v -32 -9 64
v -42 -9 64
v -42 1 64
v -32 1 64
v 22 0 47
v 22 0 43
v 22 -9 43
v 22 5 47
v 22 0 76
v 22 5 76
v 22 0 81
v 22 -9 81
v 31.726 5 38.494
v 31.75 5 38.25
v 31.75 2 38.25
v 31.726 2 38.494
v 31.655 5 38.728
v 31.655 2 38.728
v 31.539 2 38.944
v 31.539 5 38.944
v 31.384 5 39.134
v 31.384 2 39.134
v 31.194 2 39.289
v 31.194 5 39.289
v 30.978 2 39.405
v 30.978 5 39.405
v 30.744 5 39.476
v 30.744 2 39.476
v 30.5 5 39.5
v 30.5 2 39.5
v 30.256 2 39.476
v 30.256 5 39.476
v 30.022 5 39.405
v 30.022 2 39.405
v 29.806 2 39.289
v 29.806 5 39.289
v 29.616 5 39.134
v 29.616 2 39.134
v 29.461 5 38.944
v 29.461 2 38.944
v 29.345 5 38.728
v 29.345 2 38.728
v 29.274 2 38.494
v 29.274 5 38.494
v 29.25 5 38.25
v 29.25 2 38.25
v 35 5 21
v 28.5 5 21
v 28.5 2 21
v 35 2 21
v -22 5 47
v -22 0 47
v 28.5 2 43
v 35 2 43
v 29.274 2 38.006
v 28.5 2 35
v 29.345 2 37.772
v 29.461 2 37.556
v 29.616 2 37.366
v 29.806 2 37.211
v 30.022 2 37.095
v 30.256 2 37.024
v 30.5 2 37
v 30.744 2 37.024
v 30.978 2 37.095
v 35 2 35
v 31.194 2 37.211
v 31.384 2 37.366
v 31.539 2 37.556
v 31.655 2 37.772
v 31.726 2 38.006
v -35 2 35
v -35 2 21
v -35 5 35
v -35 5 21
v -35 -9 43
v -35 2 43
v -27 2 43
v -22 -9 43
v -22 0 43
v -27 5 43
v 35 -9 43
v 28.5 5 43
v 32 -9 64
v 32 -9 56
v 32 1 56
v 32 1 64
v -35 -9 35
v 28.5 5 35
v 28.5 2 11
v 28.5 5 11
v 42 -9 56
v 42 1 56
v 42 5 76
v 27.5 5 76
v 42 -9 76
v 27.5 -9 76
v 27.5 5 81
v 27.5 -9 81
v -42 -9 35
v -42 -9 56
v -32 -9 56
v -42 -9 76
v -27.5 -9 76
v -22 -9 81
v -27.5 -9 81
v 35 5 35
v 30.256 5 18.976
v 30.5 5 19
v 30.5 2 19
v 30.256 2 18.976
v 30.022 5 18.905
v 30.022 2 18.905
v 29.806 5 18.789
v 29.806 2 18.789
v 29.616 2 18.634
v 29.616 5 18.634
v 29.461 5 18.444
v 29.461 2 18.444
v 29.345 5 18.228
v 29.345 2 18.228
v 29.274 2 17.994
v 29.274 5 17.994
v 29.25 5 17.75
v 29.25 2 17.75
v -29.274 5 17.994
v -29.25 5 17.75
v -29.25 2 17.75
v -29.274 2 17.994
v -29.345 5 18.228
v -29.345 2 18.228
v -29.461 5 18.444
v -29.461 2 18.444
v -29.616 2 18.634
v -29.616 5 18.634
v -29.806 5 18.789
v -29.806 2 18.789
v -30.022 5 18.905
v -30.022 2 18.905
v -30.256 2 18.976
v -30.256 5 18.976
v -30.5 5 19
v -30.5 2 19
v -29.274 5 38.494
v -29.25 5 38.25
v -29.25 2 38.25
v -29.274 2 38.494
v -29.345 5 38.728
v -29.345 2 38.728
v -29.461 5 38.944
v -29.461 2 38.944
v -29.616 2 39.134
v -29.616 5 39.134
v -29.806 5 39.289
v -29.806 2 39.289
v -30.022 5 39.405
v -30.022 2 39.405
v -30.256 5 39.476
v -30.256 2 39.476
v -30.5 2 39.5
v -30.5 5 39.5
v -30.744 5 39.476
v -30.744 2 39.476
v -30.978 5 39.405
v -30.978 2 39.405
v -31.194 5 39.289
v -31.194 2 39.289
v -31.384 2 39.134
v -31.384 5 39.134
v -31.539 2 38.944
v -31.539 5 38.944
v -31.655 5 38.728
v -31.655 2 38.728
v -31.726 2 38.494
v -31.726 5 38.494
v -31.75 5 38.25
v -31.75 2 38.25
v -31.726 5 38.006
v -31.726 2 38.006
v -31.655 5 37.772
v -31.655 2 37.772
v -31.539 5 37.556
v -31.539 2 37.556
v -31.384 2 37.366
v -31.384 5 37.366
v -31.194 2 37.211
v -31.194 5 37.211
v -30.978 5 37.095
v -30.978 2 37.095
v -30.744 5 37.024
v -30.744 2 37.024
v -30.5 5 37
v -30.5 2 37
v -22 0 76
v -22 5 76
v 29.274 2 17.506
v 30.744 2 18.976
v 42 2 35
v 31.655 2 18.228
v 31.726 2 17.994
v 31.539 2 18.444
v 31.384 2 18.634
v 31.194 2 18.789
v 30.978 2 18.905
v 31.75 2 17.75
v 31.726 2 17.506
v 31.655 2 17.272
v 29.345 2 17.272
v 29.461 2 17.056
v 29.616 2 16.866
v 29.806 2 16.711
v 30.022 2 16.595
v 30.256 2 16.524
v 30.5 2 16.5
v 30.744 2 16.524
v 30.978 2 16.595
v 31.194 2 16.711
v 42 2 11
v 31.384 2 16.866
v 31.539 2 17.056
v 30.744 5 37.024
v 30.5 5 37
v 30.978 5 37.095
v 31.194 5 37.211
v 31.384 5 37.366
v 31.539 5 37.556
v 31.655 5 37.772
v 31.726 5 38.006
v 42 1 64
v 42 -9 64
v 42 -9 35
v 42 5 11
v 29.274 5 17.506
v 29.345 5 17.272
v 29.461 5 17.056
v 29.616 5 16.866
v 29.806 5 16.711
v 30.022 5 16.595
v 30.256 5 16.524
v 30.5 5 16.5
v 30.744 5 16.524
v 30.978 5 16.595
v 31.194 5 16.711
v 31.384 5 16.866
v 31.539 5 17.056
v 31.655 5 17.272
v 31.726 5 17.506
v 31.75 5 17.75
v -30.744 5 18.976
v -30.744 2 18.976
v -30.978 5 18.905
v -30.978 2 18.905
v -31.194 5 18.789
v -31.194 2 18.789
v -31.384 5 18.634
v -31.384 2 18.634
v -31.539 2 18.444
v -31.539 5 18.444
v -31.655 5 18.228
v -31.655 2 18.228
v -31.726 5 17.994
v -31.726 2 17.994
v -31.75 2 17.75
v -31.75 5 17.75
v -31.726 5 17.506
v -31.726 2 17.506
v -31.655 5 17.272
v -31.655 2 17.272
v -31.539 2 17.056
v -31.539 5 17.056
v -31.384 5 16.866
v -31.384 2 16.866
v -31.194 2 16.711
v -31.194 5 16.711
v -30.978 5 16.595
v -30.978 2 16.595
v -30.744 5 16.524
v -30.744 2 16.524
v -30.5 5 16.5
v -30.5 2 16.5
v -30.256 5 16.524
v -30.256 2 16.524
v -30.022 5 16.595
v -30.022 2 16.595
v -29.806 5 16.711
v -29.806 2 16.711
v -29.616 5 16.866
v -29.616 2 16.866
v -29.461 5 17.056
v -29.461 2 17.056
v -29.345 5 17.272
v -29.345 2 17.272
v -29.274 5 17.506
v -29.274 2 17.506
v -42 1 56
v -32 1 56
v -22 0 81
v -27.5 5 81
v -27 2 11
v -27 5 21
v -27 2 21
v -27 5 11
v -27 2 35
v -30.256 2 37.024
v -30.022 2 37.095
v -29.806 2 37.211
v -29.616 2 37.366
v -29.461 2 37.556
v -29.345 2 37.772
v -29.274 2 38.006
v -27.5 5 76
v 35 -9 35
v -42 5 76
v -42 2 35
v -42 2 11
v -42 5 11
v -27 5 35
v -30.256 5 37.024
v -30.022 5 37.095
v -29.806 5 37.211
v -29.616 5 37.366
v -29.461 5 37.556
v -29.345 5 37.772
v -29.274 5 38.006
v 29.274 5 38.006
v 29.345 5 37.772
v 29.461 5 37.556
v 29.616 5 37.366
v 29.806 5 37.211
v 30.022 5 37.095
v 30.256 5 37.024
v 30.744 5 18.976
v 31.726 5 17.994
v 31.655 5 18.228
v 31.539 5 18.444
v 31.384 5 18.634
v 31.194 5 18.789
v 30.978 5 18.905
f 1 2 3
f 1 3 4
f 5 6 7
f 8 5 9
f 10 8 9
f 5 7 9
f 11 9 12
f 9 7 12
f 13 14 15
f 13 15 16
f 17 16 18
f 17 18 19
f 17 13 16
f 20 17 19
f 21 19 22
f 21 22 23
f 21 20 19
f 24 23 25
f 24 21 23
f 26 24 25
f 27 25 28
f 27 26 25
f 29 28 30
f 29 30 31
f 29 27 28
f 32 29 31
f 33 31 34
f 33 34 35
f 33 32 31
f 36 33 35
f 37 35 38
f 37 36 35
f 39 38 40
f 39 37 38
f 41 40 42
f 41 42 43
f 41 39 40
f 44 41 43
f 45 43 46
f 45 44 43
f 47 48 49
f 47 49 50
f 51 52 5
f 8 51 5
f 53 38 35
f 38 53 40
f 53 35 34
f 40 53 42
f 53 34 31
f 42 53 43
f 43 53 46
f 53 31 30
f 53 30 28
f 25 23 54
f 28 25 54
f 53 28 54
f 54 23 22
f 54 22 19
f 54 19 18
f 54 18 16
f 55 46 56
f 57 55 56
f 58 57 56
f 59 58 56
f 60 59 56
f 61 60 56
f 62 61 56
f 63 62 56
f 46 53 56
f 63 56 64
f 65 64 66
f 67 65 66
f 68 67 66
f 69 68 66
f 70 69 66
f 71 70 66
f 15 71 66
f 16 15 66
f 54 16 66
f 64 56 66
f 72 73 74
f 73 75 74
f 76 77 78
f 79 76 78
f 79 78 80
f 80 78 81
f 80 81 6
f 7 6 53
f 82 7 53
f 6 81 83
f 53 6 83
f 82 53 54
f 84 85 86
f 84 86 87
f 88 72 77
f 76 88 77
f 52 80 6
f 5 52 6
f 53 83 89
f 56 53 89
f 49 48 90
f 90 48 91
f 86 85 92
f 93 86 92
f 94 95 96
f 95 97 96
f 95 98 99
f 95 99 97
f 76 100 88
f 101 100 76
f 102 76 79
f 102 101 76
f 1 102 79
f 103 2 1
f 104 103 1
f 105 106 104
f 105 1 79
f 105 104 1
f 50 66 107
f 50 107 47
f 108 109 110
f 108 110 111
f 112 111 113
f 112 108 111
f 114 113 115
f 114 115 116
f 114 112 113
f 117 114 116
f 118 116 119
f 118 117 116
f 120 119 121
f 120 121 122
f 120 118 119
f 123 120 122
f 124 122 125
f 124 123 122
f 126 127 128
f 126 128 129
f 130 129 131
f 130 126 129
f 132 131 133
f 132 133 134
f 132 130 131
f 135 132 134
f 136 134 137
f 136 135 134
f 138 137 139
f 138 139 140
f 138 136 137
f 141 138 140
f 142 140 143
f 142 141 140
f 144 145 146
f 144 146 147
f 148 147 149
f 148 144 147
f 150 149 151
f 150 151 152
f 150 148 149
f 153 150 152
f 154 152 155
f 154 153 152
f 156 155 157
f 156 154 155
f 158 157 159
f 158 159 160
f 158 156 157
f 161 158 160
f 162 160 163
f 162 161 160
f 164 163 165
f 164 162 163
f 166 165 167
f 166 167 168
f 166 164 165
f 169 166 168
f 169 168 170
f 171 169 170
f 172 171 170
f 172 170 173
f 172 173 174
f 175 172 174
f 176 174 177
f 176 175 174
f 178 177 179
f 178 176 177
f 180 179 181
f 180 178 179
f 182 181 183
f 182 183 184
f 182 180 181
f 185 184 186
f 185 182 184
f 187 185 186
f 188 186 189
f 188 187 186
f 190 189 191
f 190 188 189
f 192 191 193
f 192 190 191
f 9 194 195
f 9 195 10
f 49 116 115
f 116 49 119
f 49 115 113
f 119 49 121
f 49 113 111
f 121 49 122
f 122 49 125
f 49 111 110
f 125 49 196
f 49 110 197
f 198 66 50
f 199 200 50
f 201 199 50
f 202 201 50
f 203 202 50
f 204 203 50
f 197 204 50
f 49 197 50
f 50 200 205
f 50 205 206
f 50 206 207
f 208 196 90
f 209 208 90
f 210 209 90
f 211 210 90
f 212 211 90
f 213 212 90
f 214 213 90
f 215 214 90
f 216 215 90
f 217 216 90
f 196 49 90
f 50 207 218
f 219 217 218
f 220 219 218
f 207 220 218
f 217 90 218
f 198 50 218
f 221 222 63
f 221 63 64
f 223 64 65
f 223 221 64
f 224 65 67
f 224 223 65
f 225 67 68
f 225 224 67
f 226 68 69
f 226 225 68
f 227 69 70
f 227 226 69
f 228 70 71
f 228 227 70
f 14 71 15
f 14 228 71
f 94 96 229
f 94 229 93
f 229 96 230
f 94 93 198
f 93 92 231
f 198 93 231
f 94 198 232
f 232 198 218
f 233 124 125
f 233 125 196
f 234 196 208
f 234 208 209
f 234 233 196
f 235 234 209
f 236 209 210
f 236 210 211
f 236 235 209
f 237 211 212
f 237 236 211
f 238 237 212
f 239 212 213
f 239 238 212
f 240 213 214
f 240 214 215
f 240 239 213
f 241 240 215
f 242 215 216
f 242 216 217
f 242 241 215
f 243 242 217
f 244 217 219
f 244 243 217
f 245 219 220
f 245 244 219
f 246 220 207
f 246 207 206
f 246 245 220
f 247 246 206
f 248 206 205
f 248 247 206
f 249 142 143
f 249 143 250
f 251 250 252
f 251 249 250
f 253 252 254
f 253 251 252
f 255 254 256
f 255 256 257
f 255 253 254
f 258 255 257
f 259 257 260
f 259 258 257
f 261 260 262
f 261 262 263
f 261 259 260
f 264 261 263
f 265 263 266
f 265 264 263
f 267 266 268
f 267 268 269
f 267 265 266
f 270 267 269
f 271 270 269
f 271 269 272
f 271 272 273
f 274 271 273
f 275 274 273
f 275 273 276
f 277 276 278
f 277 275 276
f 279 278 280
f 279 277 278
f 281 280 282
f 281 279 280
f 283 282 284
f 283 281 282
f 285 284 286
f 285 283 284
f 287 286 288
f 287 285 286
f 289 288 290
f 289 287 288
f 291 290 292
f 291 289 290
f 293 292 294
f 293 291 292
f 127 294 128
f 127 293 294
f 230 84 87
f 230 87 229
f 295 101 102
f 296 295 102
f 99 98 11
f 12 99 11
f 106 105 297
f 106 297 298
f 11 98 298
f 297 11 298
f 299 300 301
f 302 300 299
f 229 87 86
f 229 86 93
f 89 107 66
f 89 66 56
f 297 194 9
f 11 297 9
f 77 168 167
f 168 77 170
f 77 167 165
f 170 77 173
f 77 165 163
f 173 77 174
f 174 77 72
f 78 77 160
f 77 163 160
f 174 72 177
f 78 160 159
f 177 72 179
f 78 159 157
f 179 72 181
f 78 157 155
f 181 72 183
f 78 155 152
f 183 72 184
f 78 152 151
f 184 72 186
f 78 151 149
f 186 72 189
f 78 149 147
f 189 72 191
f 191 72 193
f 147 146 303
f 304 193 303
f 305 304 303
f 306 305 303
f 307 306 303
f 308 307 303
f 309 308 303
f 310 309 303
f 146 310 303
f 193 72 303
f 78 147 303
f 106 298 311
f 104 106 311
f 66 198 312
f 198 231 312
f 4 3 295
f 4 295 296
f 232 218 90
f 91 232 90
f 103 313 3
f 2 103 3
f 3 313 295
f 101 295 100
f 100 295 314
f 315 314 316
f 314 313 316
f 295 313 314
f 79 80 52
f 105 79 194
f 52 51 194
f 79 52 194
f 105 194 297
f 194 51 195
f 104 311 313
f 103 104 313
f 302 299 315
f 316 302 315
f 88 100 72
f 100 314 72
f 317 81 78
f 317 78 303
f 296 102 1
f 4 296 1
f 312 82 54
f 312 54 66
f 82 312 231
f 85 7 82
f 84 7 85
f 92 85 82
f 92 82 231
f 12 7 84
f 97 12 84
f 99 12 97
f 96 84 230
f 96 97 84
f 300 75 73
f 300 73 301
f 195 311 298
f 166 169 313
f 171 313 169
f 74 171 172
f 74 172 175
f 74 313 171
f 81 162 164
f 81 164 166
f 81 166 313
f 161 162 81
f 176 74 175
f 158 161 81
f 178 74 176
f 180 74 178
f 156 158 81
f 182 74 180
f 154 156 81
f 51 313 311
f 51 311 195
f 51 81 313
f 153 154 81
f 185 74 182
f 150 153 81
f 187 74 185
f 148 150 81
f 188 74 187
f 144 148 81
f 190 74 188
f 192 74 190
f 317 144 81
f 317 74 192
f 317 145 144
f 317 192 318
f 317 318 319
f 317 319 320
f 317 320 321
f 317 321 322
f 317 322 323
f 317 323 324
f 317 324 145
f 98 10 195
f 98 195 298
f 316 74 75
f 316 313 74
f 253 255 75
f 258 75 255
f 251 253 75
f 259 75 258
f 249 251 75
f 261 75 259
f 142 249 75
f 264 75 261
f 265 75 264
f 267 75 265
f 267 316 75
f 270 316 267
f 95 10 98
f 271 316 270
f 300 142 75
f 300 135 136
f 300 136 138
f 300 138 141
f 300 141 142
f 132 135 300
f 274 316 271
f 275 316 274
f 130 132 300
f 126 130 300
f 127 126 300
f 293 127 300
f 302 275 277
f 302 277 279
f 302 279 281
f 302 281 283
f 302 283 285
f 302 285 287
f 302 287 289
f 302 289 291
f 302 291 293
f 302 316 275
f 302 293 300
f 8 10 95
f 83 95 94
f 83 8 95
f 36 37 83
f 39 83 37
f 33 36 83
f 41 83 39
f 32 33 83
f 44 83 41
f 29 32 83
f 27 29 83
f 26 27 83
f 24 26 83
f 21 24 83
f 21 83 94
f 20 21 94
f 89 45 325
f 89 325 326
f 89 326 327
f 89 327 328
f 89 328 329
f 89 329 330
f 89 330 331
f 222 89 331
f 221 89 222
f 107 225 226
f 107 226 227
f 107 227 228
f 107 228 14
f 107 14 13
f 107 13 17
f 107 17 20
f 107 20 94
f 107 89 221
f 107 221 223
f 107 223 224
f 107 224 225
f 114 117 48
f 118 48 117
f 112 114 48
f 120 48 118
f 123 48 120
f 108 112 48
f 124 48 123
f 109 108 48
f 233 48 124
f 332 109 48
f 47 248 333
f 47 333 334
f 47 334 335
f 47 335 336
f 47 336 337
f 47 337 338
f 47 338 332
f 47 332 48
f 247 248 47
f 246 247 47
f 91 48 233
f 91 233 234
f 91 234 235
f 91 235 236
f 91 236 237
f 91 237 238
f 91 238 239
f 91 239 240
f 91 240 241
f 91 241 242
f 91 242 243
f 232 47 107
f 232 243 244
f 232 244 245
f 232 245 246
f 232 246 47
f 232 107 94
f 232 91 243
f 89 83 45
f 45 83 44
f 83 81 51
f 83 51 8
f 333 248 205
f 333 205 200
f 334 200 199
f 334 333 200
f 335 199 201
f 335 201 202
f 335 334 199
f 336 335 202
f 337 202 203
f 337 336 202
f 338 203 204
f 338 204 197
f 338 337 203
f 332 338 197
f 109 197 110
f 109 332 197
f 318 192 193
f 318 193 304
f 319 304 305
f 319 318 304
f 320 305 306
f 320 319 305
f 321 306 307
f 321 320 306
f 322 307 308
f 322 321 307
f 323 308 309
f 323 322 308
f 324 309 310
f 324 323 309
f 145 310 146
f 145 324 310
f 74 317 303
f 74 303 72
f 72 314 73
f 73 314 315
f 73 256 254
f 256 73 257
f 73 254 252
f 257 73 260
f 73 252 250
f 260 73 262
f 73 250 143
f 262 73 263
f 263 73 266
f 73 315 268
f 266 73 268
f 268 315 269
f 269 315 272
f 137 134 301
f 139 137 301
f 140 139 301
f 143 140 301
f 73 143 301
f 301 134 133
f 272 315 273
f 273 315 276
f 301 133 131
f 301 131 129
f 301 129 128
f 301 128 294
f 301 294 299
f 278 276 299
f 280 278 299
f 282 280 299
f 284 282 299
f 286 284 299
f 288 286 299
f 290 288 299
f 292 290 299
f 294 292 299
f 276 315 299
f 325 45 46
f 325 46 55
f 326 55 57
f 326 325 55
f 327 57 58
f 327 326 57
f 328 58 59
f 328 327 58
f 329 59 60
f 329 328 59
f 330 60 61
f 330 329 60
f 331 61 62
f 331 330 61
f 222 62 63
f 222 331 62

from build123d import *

# Parameters (mm, degrees)
SKETCH1_W           = 70
SKETCH1_H           = 30
SKETCH1_W_2         = 55
SKETCH1_H_2         = 5
BOSS_EXTRUDE1_DEPTH = 5
BOSS_EXTRUDE2_DEPTH = 9
CUT_EXTRUDE1_DEPTH  = 2
BOSS_EXTRUDE3_DEPTH = 3
SKETCH7_W           = 54
SKETCH7_H           = 2
SKETCH7_W_2         = 1.5
SKETCH7_H_2         = 8
CUT_EXTRUDE4_DEPTH  = 10
SKETCH8_W           = 10
SKETCH8_H           = 8
CUT_EXTRUDE5_DEPTH  = 10


with BuildPart() as part:
    # Sketch1 → Boss-Extrude1 (new body)
    with BuildSketch(Plane(origin=(0, 0, 0), x_dir=(1, 0, 0), z_dir=(0, 1, 0))):
        Polygon((-5.25, -11), (-29.5, -11), (-42, -11), (-42, -76), (-27.5, -76), (-22, -76), (-22, -47), (22, -47), (22, -76), (27.5, -76), (42, -76), (42, -11), (29.5, -11), (5.25, -11), align=None)
        with Locations((0, -28)):
            Rectangle(SKETCH1_W, SKETCH1_H, mode=Mode.SUBTRACT)
        Polygon((-5.25, -11), (-29.5, -11), (-42, -11), (-42, -76), (-27.5, -76), (-22, -76), (-22, -47), (22, -47), (22, -76), (27.5, -76), (42, -76), (42, -11), (29.5, -11), (5.25, -11), align=None)
        with Locations((0, -28)):
            Rectangle(SKETCH1_W, SKETCH1_H, mode=Mode.SUBTRACT)
        Polygon((-5.25, -11), (-29.5, -11), (-42, -11), (-42, -76), (-27.5, -76), (-22, -76), (-22, -47), (22, -47), (22, -76), (27.5, -76), (42, -76), (42, -11), (29.5, -11), (5.25, -11), align=None)
        with Locations((0, -28)):
            Rectangle(SKETCH1_W, SKETCH1_H, mode=Mode.SUBTRACT)
        with Locations((0, -78.5)):
            Rectangle(SKETCH1_W_2, SKETCH1_H_2)
    extrude(amount=BOSS_EXTRUDE1_DEPTH)

    # Sketch2 → Boss-Extrude2 (add)
    with BuildSketch(Plane.XZ):
        Polygon((-27.5, 76), (-42, 76), (-42, 35), (-35, 35), (-35, 43), (-22, 43), (-22, 81), (-27.5, 81), align=None)
        Polygon((22, 81), (22, 43), (35, 43), (35, 35), (42, 35), (42, 76), (27.5, 76), (27.5, 81), align=None)
    extrude(amount=BOSS_EXTRUDE2_DEPTH)

    # Sketch3 → Cut-Extrude1 (cut)
    with BuildSketch(Plane.XZ):
        Polygon((-42, 35), (-42, 11), (42, 11), (42, 35), (35, 35), (35, 13), (-35, 13), (-35, 35), align=None)
    extrude(amount=-CUT_EXTRUDE1_DEPTH, mode=Mode.SUBTRACT)

    # Sketch6 → Boss-Extrude3 (add)
    with BuildSketch(Plane(origin=(0, 5, 0), x_dir=(1, 0, 0), z_dir=(0, 1, 0))):
        with BuildLine():
            ThreePointArc((-30.5, -19), (-31.383883476, -16.866116524), (-29.25, -17.75))
            Line((-29.25, -17.75), (-27, -17.75))
            Line((-27, -17.75), (-27, -13))
            Line((-27, -13), (-35, -13))
            Line((-35, -13), (-35, -21))
            Line((-35, -21), (-30.5, -21))
            Line((-30.5, -21), (-30.5, -19))
        make_face()
        with BuildLine():
            Line((-27, -17.75), (-29.25, -17.75))
            ThreePointArc((-29.25, -17.75), (-29.616116524, -18.633883476), (-30.5, -19))
            Line((-30.5, -19), (-30.5, -21))
            Line((-30.5, -21), (-27, -21))
            Line((-27, -21), (-27, -17.75))
        make_face()
        with BuildLine():
            Line((-30.5, -37), (-30.5, -35))
            Line((-30.5, -35), (-35, -35))
            Line((-35, -35), (-35, -43))
            Line((-35, -43), (-27, -43))
            Line((-27, -43), (-27, -38.25))
            Line((-27, -38.25), (-29.25, -38.25))
            ThreePointArc((-29.25, -38.25), (-31.383883476, -39.133883476), (-30.5, -37))
        make_face()
        with BuildLine():
            Line((-27, -35), (-30.5, -35))
            Line((-30.5, -35), (-30.5, -37))
            ThreePointArc((-30.5, -37), (-29.616116524, -37.366116524), (-29.25, -38.25))
            Line((-29.25, -38.25), (-27, -38.25))
            Line((-27, -38.25), (-27, -35))
        make_face()
        with BuildLine():
            Line((35, -35), (30.5, -35))
            Line((30.5, -35), (30.5, -37))
            ThreePointArc((30.5, -37), (31.383883476, -37.366116524), (31.75, -38.25))
            ThreePointArc((31.75, -38.25), (30.5, -39.5), (29.25, -38.25))
            Line((29.25, -38.25), (27, -38.25))
            Line((27, -38.25), (27, -43))
            Line((27, -43), (35, -43))
            Line((35, -43), (35, -35))
        make_face()
        with BuildLine():
            Line((30.5, -37), (30.5, -35))
            Line((30.5, -35), (27, -35))
            Line((27, -35), (27, -38.25))
            Line((27, -38.25), (29.25, -38.25))
            ThreePointArc((29.25, -38.25), (29.616116524, -37.366116524), (30.5, -37))
        make_face()
        with BuildLine():
            Line((27, -13), (27, -17.75))
            Line((27, -17.75), (29.25, -17.75))
            ThreePointArc((29.25, -17.75), (30.5, -16.5), (31.75, -17.75))
            ThreePointArc((31.75, -17.75), (31.383883476, -18.633883476), (30.5, -19))
            Line((30.5, -19), (30.5, -21))
            Line((30.5, -21), (35, -21))
            Line((35, -21), (35, -13))
            Line((35, -13), (27, -13))
        make_face()
        with BuildLine():
            Line((29.25, -17.75), (27, -17.75))
            Line((27, -17.75), (27, -21))
            Line((27, -21), (30.5, -21))
            Line((30.5, -21), (30.5, -19))
            ThreePointArc((30.5, -19), (29.616116524, -18.633883476), (29.25, -17.75))
        make_face()
    extrude(amount=-BOSS_EXTRUDE3_DEPTH)

    # Sketch7 → Cut-Extrude4 (cut)
    with BuildSketch(Plane(origin=(0, 5, 0), x_dir=(1, 0, 0), z_dir=(0, 1, 0))):
        Polygon((27, -11), (27, -13), (27, -21), (28.5, -21), (28.5, -11), align=None)
        with Locations((0, -12)):
            Rectangle(SKETCH7_W, SKETCH7_H)
        with Locations((27.75, -39)):
            Rectangle(SKETCH7_W_2, SKETCH7_H_2)
    extrude(amount=-CUT_EXTRUDE4_DEPTH, mode=Mode.SUBTRACT)

    # Sketch8 → Cut-Extrude5 (cut)
    with BuildSketch(Plane.XZ.offset(9)):
        with Locations((-37, 60)):
            Rectangle(SKETCH8_W, SKETCH8_H)
        with Locations((37, 60)):
            Rectangle(SKETCH8_W, SKETCH8_H)
    extrude(amount=-CUT_EXTRUDE5_DEPTH, mode=Mode.SUBTRACT)


solid = part.part
